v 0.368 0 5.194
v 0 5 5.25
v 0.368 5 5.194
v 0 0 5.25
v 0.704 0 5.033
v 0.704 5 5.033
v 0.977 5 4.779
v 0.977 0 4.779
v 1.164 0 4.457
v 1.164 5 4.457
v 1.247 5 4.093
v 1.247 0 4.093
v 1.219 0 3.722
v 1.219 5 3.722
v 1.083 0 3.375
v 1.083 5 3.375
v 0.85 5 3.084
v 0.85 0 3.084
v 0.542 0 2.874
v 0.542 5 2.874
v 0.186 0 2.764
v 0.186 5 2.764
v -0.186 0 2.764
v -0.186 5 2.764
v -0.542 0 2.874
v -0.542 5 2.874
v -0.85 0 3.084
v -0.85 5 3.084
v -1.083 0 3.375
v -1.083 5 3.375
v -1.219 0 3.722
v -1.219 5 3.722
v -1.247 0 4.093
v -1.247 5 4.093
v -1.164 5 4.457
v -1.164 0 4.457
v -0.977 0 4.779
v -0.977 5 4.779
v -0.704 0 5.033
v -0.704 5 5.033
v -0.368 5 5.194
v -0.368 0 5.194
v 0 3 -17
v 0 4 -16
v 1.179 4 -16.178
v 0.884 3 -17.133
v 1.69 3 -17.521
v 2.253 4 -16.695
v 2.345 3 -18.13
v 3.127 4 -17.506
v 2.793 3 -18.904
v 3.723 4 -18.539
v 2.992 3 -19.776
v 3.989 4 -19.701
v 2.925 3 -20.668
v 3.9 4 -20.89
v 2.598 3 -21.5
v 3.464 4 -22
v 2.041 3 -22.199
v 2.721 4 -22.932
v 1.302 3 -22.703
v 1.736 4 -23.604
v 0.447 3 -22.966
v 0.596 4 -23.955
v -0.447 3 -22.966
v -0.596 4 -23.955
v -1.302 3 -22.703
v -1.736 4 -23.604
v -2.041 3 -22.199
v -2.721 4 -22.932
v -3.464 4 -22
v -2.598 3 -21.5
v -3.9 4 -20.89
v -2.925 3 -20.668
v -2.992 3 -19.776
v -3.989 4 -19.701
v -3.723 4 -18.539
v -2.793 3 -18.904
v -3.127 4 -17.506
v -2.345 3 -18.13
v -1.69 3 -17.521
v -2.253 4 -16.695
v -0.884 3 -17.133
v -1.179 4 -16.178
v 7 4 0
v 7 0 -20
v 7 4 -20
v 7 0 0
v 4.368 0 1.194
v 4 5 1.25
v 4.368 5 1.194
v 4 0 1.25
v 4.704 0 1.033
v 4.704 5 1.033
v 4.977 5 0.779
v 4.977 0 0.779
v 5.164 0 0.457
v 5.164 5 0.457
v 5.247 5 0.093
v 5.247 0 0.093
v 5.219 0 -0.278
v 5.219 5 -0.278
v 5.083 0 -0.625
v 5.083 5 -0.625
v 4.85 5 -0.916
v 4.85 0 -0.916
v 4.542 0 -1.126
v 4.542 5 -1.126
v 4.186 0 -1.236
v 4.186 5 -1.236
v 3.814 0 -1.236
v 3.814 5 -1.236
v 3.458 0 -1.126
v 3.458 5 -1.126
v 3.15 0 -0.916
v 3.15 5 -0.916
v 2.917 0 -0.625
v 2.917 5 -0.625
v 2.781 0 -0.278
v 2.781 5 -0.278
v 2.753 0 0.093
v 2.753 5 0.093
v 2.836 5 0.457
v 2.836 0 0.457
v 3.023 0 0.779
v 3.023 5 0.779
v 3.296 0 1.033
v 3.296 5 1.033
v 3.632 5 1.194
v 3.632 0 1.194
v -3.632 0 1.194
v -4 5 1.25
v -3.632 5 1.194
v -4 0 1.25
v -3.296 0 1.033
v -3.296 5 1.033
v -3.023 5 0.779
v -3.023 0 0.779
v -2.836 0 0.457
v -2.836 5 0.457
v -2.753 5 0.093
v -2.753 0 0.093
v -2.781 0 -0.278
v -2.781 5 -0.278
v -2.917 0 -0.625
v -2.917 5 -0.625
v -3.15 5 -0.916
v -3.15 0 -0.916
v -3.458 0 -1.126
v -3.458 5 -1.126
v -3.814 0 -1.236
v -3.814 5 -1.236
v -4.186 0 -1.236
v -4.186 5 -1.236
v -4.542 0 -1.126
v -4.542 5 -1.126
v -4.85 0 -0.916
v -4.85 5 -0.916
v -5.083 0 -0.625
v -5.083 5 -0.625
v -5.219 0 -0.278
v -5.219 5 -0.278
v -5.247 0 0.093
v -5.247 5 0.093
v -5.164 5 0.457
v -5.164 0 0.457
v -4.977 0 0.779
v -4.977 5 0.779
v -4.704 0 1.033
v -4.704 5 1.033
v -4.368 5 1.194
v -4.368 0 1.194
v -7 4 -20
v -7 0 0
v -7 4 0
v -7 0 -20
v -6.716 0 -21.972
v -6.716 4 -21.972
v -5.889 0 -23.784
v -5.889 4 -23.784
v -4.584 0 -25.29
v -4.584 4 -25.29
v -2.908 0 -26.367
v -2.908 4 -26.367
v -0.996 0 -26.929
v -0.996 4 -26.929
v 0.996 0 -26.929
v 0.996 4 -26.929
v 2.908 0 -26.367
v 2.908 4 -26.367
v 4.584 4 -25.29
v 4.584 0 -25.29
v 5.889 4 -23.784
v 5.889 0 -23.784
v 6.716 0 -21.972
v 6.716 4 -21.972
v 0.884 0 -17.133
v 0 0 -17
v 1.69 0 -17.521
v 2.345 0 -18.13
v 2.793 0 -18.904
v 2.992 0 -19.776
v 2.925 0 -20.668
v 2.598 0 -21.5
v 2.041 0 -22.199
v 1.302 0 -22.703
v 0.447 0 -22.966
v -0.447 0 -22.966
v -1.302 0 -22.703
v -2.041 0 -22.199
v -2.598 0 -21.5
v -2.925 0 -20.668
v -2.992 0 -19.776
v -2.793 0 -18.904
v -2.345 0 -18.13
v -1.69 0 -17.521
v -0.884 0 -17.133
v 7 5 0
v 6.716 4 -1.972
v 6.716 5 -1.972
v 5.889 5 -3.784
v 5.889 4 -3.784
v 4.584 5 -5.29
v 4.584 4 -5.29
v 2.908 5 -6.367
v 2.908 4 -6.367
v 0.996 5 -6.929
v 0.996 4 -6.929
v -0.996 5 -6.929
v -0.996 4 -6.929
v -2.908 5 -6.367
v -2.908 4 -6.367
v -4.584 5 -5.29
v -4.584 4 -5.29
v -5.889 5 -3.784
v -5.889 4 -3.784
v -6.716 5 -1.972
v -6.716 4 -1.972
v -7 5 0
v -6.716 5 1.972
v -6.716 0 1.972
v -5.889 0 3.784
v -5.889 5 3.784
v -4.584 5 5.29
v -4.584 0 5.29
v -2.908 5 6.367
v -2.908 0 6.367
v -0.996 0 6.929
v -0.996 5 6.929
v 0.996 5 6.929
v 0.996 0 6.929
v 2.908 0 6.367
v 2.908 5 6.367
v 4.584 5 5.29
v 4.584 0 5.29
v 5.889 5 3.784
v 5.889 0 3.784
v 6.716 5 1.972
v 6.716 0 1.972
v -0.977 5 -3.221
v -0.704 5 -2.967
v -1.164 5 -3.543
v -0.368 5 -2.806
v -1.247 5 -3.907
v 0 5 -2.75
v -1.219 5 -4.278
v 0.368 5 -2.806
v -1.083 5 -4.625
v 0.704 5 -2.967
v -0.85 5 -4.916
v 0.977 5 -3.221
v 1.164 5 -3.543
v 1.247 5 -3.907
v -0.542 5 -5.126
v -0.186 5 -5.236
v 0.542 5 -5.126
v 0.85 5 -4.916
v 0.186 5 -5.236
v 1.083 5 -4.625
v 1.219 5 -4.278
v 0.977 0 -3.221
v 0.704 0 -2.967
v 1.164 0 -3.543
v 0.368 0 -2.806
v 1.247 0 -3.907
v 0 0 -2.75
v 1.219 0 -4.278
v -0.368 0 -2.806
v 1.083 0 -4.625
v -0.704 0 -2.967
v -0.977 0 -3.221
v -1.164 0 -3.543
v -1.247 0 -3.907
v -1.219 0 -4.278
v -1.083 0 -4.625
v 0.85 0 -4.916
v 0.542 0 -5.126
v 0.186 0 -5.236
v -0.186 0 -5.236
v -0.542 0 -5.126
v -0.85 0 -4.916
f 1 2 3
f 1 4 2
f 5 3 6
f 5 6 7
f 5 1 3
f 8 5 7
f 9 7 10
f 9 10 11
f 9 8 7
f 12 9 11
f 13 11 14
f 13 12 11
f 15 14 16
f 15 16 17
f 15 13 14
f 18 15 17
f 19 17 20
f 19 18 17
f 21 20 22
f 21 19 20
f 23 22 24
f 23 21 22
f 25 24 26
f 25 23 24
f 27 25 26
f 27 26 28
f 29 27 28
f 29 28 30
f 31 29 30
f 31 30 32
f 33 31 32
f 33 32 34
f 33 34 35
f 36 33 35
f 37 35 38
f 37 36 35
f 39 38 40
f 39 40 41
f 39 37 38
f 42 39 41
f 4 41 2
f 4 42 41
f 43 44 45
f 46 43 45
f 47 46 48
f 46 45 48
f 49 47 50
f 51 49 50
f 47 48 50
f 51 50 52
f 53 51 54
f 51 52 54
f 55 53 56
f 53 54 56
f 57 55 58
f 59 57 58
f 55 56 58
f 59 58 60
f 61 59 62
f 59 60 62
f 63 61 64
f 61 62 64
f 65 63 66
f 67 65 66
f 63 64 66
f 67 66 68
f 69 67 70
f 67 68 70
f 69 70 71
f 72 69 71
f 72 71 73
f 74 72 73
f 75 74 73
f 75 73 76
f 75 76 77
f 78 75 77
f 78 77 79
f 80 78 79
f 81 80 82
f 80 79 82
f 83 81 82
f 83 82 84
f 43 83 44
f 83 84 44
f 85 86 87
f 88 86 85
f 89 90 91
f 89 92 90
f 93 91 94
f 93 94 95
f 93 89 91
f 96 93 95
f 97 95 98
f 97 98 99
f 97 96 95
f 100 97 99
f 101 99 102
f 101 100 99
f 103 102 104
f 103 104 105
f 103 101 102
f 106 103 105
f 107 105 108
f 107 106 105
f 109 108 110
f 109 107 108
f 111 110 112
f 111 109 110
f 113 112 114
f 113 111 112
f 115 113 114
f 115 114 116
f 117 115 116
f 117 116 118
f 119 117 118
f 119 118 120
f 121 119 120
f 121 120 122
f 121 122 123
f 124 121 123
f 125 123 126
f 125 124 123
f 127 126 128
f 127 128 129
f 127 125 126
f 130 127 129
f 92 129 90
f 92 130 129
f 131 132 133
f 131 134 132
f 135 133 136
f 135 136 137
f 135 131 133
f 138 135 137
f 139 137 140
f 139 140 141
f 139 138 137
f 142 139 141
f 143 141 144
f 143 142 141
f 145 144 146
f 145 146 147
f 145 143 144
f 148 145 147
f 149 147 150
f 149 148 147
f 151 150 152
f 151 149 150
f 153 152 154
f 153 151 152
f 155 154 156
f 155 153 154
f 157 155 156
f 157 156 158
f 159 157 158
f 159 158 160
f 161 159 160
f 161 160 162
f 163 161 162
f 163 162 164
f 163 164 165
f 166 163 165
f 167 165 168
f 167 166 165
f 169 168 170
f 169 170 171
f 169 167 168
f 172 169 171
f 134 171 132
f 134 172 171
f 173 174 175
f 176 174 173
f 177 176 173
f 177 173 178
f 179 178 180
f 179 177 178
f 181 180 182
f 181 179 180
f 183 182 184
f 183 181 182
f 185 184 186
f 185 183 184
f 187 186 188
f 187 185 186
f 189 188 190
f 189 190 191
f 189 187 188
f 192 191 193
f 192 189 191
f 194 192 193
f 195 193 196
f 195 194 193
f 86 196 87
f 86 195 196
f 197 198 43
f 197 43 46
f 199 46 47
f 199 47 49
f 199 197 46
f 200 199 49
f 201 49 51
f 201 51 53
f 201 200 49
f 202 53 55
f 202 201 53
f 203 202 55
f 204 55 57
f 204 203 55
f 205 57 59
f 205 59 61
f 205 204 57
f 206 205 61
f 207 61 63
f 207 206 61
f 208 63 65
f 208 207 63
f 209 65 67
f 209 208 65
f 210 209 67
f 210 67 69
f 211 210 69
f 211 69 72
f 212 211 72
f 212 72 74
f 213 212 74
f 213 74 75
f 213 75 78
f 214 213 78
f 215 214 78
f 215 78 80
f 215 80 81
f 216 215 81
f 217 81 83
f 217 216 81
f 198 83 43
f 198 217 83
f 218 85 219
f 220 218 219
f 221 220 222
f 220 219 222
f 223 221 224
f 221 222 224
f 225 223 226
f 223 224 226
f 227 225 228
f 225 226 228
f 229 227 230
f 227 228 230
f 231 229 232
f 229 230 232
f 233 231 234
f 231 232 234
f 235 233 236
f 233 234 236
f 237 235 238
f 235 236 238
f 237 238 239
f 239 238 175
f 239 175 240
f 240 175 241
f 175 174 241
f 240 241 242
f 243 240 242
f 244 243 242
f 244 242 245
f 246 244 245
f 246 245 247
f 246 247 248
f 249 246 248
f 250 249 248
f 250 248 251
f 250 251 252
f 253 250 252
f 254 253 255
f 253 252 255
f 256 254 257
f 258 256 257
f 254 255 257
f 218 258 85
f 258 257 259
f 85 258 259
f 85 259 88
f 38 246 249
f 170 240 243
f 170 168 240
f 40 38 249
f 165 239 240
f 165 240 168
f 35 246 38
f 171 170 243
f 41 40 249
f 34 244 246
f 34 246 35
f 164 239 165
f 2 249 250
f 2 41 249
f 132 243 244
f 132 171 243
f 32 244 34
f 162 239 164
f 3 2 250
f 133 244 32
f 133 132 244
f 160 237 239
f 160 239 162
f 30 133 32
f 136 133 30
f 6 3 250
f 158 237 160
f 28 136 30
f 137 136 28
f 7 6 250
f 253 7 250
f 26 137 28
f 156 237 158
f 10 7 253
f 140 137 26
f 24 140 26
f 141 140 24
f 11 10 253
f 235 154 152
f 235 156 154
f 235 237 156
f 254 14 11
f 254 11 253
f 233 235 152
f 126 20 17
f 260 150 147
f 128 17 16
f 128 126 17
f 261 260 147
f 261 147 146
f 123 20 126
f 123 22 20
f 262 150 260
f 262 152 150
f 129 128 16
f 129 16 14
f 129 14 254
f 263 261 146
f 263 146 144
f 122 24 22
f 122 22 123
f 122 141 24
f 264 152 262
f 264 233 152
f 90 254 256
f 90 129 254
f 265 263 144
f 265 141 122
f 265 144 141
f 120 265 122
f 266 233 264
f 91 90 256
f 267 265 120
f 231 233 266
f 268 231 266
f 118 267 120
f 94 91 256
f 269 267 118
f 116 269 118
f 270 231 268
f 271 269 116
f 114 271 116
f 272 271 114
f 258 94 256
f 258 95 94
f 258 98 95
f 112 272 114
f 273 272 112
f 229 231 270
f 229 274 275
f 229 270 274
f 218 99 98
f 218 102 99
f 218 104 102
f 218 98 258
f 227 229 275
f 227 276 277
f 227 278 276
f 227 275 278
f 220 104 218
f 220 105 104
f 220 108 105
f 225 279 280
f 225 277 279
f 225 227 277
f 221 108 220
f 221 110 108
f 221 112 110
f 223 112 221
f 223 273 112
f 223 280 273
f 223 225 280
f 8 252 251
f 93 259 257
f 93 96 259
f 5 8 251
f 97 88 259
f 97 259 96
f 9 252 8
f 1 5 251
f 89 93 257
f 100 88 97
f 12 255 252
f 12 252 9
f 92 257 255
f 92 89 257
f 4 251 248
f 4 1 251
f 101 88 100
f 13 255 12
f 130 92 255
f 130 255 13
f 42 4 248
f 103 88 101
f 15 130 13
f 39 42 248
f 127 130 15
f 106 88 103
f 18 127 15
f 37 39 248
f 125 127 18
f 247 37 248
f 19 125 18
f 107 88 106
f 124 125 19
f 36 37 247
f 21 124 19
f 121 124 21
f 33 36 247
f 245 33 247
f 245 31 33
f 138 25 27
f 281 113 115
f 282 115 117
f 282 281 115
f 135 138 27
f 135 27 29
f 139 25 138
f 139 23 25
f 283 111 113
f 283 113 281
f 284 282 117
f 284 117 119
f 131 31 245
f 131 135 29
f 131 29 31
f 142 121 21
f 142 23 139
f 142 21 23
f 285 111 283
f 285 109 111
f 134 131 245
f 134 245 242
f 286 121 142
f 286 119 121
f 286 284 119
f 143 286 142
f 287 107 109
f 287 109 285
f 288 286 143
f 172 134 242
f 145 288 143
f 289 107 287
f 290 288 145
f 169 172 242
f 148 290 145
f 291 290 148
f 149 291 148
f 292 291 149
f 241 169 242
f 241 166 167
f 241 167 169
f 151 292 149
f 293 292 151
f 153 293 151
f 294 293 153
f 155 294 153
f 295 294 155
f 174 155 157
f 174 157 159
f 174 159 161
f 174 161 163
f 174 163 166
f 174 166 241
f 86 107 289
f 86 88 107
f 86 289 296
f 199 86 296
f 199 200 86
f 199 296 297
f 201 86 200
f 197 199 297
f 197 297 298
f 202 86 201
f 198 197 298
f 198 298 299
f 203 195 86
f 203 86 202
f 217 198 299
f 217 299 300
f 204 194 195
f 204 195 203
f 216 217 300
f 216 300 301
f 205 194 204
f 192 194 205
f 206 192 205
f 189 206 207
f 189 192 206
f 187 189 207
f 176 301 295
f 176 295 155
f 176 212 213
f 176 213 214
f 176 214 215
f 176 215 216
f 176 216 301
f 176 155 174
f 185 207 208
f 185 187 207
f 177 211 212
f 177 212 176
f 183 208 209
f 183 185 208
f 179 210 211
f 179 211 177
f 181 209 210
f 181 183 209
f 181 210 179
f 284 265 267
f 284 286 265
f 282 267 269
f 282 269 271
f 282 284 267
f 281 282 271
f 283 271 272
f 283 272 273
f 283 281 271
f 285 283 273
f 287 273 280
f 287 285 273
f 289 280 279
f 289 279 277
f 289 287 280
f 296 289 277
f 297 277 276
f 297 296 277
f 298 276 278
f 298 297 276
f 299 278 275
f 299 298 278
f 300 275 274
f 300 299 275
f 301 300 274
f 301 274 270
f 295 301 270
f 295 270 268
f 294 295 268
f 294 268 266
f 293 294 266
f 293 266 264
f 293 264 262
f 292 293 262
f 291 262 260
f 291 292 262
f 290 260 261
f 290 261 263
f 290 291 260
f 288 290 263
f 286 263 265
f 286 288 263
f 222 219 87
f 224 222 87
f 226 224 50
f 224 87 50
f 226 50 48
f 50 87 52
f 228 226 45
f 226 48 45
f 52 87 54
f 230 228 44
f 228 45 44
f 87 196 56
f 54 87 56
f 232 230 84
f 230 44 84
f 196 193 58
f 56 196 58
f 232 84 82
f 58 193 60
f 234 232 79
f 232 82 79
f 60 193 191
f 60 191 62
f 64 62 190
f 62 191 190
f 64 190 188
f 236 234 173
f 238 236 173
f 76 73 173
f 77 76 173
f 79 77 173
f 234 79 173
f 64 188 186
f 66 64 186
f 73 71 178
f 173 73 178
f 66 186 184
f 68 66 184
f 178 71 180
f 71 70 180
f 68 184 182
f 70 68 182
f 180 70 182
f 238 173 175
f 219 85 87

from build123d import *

# Parameters (mm, degrees)
SKETCH_1_R      = 1.25
SKETCH_1_R_2    = 3
EXTRUDE_1_DEPTH = 4
CHAMFER_1_SIZE  = 1
SKETCH_2_R      = 7
SKETCH_2_R_2    = 1.25
EXTRUDE_2_DEPTH = 1


with BuildPart() as part:
    # 草图1 → 凸台-拉伸1 (new body)
    with BuildSketch(Plane(origin=(0, 0, 0), x_dir=(1, 0, 0), z_dir=(0, 1, 0))):
        with BuildLine():
            Line((-7, 0), (-7, 20))
            ThreePointArc((-7, 20), (0, 27), (7, 20))
            Line((7, 20), (7, 0))
            ThreePointArc((7, 0), (0, -7), (-7, 0))
        make_face()
        with Locations(Location((0, 4, 0), (0, 0, 270))):
            Circle(SKETCH_1_R, mode=Mode.SUBTRACT)
        with Locations(Location((4, 0, 0), (0, 0, 270))):
            Circle(SKETCH_1_R, mode=Mode.SUBTRACT)
        with Locations(Location((0, -4, 0), (0, 0, 270))):
            Circle(SKETCH_1_R, mode=Mode.SUBTRACT)
        with Locations(Location((-4, 0, 0), (0, 0, 270))):
            Circle(SKETCH_1_R, mode=Mode.SUBTRACT)
        with Locations(Location((0, 20, 0), (0, 0, 270))):
            Circle(SKETCH_1_R_2, mode=Mode.SUBTRACT)
    extrude(amount=EXTRUDE_1_DEPTH)

    # 倒角1
    chamfer_1_edges = [part.edges().sort_by_distance(p)[0] for p in [
        (0, 4, -23),
    ]]
    chamfer(chamfer_1_edges, length=CHAMFER_1_SIZE)

    # 草图2 → 凸台-拉伸2 (add)
    with BuildSketch(Plane(origin=(0, 4, 0), x_dir=(1, 0, 0), z_dir=(0, 1, 0))):
        Circle(SKETCH_2_R)
        with Locations(Location((4, 0, 0), (0, 0, 270))):
            Circle(SKETCH_2_R_2, mode=Mode.SUBTRACT)
        with Locations(Location((0, 4, 0), (0, 0, 270))):
            Circle(SKETCH_2_R_2, mode=Mode.SUBTRACT)
        with Locations(Location((-4, 0, 0), (0, 0, 270))):
            Circle(SKETCH_2_R_2, mode=Mode.SUBTRACT)
        with Locations(Location((0, -4, 0), (0, 0, 270))):
            Circle(SKETCH_2_R_2, mode=Mode.SUBTRACT)
    extrude(amount=EXTRUDE_2_DEPTH)


solid = part.part
